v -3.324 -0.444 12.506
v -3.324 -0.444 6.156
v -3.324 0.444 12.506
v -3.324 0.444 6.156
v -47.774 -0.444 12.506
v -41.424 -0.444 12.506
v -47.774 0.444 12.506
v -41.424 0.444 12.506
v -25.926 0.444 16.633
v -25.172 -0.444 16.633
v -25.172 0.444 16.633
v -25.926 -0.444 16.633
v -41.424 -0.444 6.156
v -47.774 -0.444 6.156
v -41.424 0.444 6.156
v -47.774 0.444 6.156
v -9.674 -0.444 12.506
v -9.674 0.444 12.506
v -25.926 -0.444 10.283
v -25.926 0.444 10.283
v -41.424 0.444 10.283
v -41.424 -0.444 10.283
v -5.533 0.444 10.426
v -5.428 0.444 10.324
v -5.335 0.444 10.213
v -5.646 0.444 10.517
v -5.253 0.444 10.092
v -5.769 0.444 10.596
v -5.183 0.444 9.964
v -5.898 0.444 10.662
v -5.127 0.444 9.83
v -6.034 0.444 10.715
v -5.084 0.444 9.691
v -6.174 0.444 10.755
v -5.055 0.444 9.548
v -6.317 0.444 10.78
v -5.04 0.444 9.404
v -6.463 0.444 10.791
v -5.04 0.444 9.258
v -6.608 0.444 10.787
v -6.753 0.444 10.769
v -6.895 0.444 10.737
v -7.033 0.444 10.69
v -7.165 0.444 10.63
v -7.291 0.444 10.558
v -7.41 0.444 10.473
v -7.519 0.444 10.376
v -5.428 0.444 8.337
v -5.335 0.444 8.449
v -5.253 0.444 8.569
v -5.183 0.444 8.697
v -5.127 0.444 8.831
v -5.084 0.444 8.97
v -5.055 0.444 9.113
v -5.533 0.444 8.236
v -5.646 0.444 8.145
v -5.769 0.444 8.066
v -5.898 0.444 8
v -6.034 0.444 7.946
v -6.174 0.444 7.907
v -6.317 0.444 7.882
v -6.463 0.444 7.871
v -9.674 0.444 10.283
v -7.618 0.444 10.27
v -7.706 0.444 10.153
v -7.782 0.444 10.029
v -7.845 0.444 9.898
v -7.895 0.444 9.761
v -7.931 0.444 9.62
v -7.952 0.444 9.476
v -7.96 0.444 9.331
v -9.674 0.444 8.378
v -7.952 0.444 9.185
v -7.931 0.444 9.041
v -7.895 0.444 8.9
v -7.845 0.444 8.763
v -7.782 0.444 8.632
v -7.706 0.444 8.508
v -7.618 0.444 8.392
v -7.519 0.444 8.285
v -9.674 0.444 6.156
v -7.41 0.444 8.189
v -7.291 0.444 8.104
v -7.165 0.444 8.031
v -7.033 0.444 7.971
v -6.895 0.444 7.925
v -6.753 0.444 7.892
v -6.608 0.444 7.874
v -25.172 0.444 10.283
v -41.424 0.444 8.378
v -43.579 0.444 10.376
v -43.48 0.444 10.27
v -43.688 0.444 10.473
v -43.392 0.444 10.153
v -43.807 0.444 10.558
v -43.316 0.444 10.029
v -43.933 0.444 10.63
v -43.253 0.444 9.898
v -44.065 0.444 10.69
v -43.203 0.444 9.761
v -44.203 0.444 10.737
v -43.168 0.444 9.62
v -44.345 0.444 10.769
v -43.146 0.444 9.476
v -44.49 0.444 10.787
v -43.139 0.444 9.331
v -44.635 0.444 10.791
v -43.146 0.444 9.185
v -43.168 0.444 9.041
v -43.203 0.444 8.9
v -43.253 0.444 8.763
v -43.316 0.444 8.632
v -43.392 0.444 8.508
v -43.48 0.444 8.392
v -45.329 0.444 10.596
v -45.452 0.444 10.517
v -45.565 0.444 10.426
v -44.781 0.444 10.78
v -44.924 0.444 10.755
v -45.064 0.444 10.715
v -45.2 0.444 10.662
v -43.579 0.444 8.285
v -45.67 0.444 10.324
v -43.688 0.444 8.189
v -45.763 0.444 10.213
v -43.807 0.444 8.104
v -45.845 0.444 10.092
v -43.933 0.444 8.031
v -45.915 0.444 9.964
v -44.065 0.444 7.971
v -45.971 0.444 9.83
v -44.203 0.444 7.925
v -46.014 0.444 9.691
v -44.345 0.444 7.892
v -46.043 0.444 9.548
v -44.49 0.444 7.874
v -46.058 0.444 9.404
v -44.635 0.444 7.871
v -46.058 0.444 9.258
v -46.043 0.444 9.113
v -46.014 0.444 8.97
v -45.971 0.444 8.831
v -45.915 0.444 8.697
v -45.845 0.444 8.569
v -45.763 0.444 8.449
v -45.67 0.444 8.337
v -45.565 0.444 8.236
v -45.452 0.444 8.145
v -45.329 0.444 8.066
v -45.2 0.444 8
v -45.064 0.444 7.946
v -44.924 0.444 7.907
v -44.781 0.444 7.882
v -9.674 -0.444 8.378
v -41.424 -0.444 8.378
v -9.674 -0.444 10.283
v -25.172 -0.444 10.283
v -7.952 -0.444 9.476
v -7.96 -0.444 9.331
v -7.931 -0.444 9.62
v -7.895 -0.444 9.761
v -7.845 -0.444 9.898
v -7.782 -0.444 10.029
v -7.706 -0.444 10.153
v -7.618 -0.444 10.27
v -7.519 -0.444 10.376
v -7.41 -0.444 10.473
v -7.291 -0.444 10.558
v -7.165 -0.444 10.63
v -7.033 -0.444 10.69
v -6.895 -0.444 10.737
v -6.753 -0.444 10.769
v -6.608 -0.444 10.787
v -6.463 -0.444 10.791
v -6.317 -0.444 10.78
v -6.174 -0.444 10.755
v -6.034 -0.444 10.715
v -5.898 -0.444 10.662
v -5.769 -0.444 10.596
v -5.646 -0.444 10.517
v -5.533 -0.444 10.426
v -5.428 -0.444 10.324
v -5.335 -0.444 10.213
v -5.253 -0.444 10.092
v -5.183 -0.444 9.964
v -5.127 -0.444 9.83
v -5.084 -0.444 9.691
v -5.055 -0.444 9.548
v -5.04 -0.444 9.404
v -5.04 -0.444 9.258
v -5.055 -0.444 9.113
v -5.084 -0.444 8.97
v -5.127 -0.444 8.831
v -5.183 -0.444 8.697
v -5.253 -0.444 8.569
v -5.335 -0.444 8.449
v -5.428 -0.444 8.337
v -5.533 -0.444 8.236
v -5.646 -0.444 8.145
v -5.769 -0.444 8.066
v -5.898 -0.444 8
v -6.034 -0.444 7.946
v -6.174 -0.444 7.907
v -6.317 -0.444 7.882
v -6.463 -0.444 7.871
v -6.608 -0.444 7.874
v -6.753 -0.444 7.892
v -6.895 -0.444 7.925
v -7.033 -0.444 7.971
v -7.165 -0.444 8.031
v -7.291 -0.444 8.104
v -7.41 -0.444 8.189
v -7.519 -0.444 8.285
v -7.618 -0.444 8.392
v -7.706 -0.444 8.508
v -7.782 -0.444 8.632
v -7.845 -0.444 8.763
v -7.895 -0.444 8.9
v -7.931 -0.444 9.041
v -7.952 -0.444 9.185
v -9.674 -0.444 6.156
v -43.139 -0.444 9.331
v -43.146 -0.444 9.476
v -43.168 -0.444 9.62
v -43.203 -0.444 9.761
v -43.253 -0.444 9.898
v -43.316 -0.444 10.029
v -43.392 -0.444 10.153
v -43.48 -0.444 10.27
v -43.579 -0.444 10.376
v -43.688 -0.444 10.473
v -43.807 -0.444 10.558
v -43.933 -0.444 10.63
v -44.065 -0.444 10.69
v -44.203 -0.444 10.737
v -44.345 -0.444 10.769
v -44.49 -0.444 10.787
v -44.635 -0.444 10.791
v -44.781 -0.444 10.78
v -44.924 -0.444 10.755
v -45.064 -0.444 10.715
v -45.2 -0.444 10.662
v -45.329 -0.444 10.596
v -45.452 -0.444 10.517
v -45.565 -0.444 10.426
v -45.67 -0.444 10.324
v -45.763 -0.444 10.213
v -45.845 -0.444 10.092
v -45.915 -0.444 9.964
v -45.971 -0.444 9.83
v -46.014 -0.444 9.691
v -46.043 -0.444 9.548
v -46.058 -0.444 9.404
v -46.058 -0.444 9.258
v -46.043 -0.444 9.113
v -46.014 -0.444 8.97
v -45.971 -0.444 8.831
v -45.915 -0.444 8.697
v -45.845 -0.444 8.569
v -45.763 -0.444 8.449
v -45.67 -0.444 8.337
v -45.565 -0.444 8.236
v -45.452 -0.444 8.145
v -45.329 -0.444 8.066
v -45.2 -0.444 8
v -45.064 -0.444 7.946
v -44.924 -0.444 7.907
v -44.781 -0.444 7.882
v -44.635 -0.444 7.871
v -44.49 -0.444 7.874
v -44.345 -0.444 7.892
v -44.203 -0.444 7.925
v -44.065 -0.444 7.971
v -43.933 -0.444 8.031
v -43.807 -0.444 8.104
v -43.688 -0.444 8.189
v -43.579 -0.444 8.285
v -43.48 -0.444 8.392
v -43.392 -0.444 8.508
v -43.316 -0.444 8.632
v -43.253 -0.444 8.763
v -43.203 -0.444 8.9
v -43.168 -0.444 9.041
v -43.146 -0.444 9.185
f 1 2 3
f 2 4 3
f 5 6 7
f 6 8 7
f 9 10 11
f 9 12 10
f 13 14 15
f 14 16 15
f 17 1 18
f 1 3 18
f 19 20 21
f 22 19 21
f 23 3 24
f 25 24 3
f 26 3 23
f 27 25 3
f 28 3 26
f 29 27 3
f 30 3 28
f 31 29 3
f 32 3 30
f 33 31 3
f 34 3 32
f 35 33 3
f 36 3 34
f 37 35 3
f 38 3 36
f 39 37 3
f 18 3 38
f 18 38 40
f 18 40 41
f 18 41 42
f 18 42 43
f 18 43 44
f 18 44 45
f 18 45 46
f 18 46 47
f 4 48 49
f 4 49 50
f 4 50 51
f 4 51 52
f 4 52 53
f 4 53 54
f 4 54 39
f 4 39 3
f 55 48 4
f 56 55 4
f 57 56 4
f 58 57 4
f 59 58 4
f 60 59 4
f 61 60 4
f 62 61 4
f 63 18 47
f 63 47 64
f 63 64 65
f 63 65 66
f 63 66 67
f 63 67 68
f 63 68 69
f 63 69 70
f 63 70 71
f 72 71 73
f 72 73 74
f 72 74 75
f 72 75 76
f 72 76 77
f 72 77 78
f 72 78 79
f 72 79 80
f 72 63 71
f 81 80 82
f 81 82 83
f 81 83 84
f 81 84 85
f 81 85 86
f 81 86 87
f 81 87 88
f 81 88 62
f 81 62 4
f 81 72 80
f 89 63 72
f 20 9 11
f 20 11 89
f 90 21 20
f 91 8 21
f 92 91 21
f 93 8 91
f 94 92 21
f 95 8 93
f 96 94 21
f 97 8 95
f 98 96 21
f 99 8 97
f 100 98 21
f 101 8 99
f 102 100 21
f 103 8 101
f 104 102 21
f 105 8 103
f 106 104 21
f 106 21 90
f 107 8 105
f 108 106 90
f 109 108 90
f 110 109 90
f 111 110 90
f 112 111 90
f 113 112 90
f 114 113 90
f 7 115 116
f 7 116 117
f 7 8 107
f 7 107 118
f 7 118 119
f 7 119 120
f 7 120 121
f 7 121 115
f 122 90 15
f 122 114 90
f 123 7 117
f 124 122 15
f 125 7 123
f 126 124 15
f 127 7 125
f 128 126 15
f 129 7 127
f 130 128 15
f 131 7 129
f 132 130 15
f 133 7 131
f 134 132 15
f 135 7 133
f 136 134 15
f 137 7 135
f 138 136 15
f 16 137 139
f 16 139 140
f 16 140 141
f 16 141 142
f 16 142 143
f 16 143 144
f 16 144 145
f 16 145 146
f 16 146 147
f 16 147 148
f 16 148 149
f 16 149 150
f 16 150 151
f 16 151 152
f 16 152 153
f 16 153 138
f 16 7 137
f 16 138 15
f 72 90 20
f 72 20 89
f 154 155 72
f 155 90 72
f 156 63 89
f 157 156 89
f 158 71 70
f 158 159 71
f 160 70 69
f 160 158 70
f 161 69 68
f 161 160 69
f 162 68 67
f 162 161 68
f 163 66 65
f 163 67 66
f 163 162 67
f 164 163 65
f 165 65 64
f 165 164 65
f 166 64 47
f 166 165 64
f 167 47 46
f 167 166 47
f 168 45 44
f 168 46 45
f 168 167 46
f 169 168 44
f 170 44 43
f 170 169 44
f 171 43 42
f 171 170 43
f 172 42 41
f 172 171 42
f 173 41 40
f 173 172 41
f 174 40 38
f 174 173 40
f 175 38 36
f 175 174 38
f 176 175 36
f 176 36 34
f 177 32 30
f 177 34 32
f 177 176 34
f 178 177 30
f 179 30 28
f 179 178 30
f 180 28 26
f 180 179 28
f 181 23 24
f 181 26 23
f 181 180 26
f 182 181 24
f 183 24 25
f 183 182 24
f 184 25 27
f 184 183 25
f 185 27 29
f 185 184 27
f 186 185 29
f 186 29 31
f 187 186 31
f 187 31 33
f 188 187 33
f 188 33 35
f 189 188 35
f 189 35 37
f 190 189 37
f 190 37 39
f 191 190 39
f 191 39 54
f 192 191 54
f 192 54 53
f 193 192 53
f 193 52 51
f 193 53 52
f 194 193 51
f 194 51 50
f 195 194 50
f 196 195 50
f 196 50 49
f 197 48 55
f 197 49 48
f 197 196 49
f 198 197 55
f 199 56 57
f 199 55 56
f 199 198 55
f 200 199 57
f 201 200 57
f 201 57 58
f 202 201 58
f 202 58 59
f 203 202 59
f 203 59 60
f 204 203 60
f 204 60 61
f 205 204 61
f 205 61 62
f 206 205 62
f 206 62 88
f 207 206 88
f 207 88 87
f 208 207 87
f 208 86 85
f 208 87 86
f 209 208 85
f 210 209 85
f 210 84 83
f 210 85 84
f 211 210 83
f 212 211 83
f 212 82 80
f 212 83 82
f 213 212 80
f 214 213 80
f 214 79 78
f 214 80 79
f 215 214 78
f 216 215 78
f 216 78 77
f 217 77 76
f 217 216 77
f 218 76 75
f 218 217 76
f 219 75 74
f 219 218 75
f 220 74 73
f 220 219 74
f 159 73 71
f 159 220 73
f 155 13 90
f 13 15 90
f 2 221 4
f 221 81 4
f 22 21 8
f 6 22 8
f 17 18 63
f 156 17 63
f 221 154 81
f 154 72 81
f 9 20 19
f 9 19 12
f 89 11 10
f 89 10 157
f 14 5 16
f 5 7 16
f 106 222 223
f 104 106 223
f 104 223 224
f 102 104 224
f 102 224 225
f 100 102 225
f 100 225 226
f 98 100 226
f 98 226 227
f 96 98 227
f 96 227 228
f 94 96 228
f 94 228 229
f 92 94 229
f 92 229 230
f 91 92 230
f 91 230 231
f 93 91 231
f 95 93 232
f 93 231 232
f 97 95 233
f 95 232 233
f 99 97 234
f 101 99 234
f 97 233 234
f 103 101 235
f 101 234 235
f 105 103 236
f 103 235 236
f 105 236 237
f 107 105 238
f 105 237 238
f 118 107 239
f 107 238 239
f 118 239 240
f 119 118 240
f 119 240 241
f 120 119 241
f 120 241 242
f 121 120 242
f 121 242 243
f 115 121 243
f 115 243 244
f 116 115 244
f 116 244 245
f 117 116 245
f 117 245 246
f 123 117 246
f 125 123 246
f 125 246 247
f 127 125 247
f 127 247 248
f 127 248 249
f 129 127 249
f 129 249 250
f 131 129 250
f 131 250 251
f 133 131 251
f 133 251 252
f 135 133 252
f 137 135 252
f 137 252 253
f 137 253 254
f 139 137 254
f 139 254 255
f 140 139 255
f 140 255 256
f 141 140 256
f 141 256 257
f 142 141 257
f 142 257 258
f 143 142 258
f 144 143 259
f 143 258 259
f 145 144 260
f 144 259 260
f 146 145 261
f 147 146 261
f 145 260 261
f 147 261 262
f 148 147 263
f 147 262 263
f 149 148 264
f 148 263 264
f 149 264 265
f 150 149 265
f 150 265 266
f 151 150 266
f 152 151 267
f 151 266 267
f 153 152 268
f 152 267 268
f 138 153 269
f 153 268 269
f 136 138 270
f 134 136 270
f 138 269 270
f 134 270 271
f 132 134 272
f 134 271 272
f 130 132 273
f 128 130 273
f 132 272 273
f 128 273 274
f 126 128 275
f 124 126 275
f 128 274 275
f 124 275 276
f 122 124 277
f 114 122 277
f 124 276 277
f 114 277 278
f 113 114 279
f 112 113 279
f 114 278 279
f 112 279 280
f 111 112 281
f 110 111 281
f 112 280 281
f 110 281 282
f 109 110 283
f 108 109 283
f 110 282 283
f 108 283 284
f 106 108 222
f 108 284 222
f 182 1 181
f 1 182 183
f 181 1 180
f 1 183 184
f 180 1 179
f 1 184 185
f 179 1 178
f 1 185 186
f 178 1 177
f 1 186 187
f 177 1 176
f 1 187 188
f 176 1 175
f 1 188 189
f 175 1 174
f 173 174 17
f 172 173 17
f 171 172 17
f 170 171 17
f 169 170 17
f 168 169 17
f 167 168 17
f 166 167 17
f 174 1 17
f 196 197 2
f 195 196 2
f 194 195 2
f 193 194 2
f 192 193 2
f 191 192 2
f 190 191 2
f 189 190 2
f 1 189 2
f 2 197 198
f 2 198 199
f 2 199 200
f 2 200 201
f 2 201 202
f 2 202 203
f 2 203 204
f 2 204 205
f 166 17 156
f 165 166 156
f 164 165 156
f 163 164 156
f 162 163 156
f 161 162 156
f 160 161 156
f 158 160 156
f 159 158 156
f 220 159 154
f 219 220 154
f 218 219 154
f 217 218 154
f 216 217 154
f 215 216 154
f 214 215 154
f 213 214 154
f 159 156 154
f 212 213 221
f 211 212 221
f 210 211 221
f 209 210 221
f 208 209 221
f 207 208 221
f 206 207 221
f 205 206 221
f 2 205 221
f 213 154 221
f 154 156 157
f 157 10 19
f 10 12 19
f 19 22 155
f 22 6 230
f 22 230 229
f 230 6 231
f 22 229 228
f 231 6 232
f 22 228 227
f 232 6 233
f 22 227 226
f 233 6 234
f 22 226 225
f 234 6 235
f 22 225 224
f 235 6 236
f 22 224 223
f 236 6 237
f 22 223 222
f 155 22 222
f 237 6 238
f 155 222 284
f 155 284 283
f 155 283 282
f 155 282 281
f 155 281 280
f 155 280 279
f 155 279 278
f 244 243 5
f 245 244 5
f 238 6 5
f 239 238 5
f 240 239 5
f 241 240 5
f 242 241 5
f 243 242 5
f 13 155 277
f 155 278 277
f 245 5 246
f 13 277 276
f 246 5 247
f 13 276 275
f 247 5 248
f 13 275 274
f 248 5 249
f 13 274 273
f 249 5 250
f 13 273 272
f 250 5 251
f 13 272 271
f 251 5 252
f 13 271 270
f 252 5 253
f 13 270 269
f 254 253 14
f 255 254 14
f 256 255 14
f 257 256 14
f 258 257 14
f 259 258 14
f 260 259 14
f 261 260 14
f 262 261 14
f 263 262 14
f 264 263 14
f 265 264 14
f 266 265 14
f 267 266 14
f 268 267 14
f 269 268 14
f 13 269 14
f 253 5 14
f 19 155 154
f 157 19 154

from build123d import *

# Parameters (mm, degrees)
BOSS_EXTRUDE1_DEPTH          = 0.4445
F_97_0_0059_DIAMETER_HOLE1_D = 2.921
SKETCH7_W                    = 0.500000016
SKETCH7_H                    = 0.889
BOSS_EXTRUDE2_DEPTH          = 6.35
SKETCH11_W                   = 6.35
SKETCH11_H                   = 0.889
BOSS_EXTRUDE3_DEPTH          = 0.127
SKETCH12_W                   = 6.35
SKETCH12_H                   = 0.889
BOSS_EXTRUDE4_DEPTH          = 0.127


with BuildPart() as part:
    # Sketch1 → Boss-Extrude1 (new, symmetric)
    with BuildSketch(Plane(origin=(0, 0, 0), x_dir=(1, 0, 0), z_dir=(0, 1, 0))):
        Polygon((-41.424046485, -10.283259465), (-41.424046485, -12.505759465), (-47.774046485, -12.505759465), (-47.774046485, -6.155759465), (-41.424046485, -6.155759465), (-41.424046485, -8.378259465), (-9.674046485, -8.378259465), (-9.674046485, -6.155759465), (-3.324046485, -6.155759465), (-3.324046485, -12.505759465), (-9.674046485, -12.505759465), (-9.674046485, -10.283259465), align=None)
    extrude(amount=BOSS_EXTRUDE1_DEPTH, both=True)

    # #97 (0.0059) Diameter Hole1 (through all)
    with Locations(Plane(origin=(0, 0.4445, 0), x_dir=(-1, 0, 0), z_dir=(0, 1, 0))):
        with Locations((44.599046485, 9.330759465)):
            f_97_0_0059_diameter_hole1 = Hole(F_97_0_0059_DIAMETER_HOLE1_D / 2)

    # Mirror1: #97 (0.0059) Diameter Hole1 across plane
    add(f_97_0_0059_diameter_hole1.mirror(Plane(origin=(-25.549046485, 0, 0), x_dir=(0, 0, 1), z_dir=(1, 0, 0))), mode=Mode.SUBTRACT)

    # Sketch7 → Boss-Extrude2 (add)
    with BuildSketch(Plane.XY.offset(10.283259465)):
        with Locations((-25.549046485, 0)):
            Rectangle(SKETCH7_W, SKETCH7_H)
    extrude(amount=BOSS_EXTRUDE2_DEPTH)

    # Sketch11 → Boss-Extrude3 (add)
    with BuildSketch(Plane.ZY.offset(25.799046493)):
        with Locations((13.458259465, 0)):
            Rectangle(SKETCH11_W, SKETCH11_H)
    extrude(amount=BOSS_EXTRUDE3_DEPTH)

    # Sketch12 → Boss-Extrude4 (add)
    with BuildSketch(Plane(origin=(-25.299046477, 0, 0), x_dir=(0, 0, -1), z_dir=(1, 0, 0))):
        with Locations((-13.458259465, 0)):
            Rectangle(SKETCH12_W, SKETCH12_H)
    extrude(amount=BOSS_EXTRUDE4_DEPTH)


solid = part.part
